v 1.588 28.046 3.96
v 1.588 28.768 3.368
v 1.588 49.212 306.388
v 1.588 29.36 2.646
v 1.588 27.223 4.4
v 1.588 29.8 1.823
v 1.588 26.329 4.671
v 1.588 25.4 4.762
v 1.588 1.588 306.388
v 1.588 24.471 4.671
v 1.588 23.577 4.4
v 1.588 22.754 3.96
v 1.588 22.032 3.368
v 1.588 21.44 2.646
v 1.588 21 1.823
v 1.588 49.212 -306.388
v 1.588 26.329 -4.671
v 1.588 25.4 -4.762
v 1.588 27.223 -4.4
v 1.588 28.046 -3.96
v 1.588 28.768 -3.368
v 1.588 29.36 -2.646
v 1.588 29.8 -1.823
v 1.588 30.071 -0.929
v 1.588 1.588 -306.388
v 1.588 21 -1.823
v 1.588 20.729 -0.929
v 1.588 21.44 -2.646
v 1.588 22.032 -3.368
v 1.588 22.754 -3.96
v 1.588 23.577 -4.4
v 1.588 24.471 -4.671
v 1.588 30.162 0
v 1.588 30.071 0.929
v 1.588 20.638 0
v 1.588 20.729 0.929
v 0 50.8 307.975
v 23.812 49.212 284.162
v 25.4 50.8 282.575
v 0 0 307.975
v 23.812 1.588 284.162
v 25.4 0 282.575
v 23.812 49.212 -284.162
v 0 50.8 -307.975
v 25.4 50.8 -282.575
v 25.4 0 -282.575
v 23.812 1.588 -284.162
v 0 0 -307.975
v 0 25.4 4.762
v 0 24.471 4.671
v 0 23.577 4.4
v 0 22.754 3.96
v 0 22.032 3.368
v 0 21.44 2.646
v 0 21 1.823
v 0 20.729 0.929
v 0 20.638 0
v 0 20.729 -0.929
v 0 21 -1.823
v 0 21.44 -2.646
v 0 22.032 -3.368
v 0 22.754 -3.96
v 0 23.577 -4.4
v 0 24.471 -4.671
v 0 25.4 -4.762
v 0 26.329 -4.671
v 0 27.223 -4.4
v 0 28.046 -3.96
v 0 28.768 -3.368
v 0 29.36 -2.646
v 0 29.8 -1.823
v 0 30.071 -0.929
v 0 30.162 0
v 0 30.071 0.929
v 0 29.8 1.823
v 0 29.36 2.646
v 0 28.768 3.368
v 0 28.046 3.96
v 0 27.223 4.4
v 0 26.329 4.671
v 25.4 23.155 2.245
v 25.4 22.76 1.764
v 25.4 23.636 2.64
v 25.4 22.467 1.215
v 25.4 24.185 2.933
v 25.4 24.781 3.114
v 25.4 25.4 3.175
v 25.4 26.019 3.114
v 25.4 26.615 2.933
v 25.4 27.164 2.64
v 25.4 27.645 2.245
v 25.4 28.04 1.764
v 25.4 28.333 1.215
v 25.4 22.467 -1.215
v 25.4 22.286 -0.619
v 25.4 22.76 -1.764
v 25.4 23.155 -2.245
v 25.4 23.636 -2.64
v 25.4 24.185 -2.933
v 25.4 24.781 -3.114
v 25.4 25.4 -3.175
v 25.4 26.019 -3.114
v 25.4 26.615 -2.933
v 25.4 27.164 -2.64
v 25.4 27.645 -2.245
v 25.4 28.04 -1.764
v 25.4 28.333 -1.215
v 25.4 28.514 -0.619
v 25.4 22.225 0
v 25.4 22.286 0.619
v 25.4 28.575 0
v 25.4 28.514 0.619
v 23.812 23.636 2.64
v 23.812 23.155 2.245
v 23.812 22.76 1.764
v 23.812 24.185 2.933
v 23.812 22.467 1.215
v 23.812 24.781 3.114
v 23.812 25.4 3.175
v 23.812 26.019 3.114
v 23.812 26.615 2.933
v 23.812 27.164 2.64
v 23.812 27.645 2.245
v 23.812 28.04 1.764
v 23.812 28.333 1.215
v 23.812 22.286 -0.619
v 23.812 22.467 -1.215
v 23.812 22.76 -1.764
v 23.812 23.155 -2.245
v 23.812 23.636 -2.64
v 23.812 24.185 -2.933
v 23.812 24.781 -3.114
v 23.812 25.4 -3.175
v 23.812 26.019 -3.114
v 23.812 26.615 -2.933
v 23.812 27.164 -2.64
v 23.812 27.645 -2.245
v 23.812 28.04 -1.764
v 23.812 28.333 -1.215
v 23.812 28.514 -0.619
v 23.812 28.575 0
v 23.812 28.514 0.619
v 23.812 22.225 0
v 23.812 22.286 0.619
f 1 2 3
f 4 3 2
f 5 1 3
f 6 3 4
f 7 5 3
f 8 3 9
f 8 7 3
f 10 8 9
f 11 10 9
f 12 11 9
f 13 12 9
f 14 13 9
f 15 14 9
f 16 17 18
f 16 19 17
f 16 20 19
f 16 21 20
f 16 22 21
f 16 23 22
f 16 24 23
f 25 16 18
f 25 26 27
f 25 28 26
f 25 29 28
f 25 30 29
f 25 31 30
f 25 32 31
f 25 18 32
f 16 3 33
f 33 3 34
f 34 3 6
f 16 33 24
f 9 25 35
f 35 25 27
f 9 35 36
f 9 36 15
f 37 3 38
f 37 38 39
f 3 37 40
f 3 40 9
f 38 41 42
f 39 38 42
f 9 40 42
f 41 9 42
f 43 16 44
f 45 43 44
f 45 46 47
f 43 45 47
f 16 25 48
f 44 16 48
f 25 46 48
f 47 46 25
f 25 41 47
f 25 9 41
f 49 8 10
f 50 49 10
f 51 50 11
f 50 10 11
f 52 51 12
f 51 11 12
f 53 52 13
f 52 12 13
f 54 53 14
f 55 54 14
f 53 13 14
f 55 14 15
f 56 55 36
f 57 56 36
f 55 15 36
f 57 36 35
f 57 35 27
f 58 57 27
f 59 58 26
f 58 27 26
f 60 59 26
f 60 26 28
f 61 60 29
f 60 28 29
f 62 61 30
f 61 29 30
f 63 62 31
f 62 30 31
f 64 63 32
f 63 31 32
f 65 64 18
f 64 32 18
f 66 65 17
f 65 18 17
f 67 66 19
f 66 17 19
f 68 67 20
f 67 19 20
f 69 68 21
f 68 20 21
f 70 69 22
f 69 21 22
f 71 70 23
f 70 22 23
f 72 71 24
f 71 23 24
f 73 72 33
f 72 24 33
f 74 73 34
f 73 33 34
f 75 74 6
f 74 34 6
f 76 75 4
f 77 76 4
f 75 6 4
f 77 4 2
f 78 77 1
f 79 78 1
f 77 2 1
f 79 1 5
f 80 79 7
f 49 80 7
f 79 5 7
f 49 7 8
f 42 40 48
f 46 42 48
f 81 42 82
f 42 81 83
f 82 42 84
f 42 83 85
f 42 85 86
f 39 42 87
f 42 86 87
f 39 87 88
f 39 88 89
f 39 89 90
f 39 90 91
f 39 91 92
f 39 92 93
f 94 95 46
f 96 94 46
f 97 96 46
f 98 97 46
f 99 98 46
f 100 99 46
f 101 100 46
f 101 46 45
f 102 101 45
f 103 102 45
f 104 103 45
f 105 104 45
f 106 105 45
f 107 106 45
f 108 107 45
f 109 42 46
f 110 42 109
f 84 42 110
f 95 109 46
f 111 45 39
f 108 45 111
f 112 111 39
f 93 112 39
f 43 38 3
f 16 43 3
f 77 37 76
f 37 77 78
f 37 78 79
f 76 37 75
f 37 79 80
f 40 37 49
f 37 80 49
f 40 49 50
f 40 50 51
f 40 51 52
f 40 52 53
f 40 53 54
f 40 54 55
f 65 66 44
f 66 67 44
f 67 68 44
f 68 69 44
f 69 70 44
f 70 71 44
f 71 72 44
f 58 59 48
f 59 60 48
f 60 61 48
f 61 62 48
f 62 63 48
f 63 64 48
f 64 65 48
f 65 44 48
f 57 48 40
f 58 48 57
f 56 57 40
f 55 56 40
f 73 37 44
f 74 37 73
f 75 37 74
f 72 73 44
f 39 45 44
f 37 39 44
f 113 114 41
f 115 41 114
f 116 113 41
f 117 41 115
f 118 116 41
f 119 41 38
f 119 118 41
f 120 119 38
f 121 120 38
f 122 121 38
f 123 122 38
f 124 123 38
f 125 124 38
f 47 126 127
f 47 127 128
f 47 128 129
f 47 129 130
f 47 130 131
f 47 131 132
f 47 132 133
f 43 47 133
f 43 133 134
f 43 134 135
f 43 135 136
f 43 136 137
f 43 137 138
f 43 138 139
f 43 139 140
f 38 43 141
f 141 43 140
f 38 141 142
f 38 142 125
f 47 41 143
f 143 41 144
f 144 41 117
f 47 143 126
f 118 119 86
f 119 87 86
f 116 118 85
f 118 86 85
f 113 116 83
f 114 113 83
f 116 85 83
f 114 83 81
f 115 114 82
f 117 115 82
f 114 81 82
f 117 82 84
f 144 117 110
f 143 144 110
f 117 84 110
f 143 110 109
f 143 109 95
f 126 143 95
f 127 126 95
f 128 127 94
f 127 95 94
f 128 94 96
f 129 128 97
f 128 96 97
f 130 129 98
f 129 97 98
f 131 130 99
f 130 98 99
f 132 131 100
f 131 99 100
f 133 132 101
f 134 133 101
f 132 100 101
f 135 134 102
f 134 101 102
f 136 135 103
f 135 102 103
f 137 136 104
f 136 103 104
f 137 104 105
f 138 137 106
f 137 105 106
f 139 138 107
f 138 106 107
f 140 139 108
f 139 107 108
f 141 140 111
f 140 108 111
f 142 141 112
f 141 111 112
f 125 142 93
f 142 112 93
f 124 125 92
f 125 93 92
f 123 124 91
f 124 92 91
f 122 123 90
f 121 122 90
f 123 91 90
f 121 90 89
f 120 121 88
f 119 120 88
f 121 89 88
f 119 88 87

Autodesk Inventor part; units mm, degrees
ref_plane "YZ Plane" through (0, 0, 0) normal (1, 0, 0) x (0, 1, 0)
ref_plane "XZ Plane" through (0, 0, 0) normal (0, 1, 0) x (-1, 0, 0)
ref_plane "XY Plane" through (0, 0, 0) normal (0, 0, 1) x (1, 0, 0)
sketch "Sketch1" plane through (0, 0, 0) normal (0, 0, 1) x (1, 0, 0)
  line L0 (0, 0) -> (25.4, 0)
  line L1 (25.4, 0) -> (25.4, 50.8)
  line L2 (25.4, 50.8) -> (0, 50.8)
  line L3 (0, 50.8) -> (0, 0)
  line L4 (1.5875, 1.5875) -> (23.8125, 1.5875)
  line L5 (23.8125, 1.5875) -> (23.8125, 49.2125)
  line L6 (23.8125, 49.2125) -> (1.5875, 49.2125)
  line L7 (1.5875, 49.2125) -> (1.5875, 1.5875)
  dimension "d0" = 25.4
  dimension "d1" = 50.8
  dimension "d2" = 1.5875
extrude "Extrusion1" add sketch "Sketch1" along normal mid plane 615.95
chamfer "Chamfer1" distance 25.4 angle 45 2 edges at (25.4, 25.4, 307.975) (25.4, 25.4, -307.975)
sketch "Sketch2" plane through (0, 0, 307.975) normal (-1, 0, 0) x (0, 0, 1)
  line L0 (-615.95, 0) -> (-615.95, 50.8) projected
  point P0 (-307.975, 0)
  point P1 (-307.975, 25.4)
  dimension "d8" = 25.4
  dimension "d9" = 307.975
hole "Hole1" at (0, 25.4, 0) direction (1, 0, 0) diameter 6.35 depth 25.4 tip angle 118 counterbore diameter 9.525 counterbore depth 6.35
properties part number "FRA_BackMainRail_002" material "Aluminum 6061"
